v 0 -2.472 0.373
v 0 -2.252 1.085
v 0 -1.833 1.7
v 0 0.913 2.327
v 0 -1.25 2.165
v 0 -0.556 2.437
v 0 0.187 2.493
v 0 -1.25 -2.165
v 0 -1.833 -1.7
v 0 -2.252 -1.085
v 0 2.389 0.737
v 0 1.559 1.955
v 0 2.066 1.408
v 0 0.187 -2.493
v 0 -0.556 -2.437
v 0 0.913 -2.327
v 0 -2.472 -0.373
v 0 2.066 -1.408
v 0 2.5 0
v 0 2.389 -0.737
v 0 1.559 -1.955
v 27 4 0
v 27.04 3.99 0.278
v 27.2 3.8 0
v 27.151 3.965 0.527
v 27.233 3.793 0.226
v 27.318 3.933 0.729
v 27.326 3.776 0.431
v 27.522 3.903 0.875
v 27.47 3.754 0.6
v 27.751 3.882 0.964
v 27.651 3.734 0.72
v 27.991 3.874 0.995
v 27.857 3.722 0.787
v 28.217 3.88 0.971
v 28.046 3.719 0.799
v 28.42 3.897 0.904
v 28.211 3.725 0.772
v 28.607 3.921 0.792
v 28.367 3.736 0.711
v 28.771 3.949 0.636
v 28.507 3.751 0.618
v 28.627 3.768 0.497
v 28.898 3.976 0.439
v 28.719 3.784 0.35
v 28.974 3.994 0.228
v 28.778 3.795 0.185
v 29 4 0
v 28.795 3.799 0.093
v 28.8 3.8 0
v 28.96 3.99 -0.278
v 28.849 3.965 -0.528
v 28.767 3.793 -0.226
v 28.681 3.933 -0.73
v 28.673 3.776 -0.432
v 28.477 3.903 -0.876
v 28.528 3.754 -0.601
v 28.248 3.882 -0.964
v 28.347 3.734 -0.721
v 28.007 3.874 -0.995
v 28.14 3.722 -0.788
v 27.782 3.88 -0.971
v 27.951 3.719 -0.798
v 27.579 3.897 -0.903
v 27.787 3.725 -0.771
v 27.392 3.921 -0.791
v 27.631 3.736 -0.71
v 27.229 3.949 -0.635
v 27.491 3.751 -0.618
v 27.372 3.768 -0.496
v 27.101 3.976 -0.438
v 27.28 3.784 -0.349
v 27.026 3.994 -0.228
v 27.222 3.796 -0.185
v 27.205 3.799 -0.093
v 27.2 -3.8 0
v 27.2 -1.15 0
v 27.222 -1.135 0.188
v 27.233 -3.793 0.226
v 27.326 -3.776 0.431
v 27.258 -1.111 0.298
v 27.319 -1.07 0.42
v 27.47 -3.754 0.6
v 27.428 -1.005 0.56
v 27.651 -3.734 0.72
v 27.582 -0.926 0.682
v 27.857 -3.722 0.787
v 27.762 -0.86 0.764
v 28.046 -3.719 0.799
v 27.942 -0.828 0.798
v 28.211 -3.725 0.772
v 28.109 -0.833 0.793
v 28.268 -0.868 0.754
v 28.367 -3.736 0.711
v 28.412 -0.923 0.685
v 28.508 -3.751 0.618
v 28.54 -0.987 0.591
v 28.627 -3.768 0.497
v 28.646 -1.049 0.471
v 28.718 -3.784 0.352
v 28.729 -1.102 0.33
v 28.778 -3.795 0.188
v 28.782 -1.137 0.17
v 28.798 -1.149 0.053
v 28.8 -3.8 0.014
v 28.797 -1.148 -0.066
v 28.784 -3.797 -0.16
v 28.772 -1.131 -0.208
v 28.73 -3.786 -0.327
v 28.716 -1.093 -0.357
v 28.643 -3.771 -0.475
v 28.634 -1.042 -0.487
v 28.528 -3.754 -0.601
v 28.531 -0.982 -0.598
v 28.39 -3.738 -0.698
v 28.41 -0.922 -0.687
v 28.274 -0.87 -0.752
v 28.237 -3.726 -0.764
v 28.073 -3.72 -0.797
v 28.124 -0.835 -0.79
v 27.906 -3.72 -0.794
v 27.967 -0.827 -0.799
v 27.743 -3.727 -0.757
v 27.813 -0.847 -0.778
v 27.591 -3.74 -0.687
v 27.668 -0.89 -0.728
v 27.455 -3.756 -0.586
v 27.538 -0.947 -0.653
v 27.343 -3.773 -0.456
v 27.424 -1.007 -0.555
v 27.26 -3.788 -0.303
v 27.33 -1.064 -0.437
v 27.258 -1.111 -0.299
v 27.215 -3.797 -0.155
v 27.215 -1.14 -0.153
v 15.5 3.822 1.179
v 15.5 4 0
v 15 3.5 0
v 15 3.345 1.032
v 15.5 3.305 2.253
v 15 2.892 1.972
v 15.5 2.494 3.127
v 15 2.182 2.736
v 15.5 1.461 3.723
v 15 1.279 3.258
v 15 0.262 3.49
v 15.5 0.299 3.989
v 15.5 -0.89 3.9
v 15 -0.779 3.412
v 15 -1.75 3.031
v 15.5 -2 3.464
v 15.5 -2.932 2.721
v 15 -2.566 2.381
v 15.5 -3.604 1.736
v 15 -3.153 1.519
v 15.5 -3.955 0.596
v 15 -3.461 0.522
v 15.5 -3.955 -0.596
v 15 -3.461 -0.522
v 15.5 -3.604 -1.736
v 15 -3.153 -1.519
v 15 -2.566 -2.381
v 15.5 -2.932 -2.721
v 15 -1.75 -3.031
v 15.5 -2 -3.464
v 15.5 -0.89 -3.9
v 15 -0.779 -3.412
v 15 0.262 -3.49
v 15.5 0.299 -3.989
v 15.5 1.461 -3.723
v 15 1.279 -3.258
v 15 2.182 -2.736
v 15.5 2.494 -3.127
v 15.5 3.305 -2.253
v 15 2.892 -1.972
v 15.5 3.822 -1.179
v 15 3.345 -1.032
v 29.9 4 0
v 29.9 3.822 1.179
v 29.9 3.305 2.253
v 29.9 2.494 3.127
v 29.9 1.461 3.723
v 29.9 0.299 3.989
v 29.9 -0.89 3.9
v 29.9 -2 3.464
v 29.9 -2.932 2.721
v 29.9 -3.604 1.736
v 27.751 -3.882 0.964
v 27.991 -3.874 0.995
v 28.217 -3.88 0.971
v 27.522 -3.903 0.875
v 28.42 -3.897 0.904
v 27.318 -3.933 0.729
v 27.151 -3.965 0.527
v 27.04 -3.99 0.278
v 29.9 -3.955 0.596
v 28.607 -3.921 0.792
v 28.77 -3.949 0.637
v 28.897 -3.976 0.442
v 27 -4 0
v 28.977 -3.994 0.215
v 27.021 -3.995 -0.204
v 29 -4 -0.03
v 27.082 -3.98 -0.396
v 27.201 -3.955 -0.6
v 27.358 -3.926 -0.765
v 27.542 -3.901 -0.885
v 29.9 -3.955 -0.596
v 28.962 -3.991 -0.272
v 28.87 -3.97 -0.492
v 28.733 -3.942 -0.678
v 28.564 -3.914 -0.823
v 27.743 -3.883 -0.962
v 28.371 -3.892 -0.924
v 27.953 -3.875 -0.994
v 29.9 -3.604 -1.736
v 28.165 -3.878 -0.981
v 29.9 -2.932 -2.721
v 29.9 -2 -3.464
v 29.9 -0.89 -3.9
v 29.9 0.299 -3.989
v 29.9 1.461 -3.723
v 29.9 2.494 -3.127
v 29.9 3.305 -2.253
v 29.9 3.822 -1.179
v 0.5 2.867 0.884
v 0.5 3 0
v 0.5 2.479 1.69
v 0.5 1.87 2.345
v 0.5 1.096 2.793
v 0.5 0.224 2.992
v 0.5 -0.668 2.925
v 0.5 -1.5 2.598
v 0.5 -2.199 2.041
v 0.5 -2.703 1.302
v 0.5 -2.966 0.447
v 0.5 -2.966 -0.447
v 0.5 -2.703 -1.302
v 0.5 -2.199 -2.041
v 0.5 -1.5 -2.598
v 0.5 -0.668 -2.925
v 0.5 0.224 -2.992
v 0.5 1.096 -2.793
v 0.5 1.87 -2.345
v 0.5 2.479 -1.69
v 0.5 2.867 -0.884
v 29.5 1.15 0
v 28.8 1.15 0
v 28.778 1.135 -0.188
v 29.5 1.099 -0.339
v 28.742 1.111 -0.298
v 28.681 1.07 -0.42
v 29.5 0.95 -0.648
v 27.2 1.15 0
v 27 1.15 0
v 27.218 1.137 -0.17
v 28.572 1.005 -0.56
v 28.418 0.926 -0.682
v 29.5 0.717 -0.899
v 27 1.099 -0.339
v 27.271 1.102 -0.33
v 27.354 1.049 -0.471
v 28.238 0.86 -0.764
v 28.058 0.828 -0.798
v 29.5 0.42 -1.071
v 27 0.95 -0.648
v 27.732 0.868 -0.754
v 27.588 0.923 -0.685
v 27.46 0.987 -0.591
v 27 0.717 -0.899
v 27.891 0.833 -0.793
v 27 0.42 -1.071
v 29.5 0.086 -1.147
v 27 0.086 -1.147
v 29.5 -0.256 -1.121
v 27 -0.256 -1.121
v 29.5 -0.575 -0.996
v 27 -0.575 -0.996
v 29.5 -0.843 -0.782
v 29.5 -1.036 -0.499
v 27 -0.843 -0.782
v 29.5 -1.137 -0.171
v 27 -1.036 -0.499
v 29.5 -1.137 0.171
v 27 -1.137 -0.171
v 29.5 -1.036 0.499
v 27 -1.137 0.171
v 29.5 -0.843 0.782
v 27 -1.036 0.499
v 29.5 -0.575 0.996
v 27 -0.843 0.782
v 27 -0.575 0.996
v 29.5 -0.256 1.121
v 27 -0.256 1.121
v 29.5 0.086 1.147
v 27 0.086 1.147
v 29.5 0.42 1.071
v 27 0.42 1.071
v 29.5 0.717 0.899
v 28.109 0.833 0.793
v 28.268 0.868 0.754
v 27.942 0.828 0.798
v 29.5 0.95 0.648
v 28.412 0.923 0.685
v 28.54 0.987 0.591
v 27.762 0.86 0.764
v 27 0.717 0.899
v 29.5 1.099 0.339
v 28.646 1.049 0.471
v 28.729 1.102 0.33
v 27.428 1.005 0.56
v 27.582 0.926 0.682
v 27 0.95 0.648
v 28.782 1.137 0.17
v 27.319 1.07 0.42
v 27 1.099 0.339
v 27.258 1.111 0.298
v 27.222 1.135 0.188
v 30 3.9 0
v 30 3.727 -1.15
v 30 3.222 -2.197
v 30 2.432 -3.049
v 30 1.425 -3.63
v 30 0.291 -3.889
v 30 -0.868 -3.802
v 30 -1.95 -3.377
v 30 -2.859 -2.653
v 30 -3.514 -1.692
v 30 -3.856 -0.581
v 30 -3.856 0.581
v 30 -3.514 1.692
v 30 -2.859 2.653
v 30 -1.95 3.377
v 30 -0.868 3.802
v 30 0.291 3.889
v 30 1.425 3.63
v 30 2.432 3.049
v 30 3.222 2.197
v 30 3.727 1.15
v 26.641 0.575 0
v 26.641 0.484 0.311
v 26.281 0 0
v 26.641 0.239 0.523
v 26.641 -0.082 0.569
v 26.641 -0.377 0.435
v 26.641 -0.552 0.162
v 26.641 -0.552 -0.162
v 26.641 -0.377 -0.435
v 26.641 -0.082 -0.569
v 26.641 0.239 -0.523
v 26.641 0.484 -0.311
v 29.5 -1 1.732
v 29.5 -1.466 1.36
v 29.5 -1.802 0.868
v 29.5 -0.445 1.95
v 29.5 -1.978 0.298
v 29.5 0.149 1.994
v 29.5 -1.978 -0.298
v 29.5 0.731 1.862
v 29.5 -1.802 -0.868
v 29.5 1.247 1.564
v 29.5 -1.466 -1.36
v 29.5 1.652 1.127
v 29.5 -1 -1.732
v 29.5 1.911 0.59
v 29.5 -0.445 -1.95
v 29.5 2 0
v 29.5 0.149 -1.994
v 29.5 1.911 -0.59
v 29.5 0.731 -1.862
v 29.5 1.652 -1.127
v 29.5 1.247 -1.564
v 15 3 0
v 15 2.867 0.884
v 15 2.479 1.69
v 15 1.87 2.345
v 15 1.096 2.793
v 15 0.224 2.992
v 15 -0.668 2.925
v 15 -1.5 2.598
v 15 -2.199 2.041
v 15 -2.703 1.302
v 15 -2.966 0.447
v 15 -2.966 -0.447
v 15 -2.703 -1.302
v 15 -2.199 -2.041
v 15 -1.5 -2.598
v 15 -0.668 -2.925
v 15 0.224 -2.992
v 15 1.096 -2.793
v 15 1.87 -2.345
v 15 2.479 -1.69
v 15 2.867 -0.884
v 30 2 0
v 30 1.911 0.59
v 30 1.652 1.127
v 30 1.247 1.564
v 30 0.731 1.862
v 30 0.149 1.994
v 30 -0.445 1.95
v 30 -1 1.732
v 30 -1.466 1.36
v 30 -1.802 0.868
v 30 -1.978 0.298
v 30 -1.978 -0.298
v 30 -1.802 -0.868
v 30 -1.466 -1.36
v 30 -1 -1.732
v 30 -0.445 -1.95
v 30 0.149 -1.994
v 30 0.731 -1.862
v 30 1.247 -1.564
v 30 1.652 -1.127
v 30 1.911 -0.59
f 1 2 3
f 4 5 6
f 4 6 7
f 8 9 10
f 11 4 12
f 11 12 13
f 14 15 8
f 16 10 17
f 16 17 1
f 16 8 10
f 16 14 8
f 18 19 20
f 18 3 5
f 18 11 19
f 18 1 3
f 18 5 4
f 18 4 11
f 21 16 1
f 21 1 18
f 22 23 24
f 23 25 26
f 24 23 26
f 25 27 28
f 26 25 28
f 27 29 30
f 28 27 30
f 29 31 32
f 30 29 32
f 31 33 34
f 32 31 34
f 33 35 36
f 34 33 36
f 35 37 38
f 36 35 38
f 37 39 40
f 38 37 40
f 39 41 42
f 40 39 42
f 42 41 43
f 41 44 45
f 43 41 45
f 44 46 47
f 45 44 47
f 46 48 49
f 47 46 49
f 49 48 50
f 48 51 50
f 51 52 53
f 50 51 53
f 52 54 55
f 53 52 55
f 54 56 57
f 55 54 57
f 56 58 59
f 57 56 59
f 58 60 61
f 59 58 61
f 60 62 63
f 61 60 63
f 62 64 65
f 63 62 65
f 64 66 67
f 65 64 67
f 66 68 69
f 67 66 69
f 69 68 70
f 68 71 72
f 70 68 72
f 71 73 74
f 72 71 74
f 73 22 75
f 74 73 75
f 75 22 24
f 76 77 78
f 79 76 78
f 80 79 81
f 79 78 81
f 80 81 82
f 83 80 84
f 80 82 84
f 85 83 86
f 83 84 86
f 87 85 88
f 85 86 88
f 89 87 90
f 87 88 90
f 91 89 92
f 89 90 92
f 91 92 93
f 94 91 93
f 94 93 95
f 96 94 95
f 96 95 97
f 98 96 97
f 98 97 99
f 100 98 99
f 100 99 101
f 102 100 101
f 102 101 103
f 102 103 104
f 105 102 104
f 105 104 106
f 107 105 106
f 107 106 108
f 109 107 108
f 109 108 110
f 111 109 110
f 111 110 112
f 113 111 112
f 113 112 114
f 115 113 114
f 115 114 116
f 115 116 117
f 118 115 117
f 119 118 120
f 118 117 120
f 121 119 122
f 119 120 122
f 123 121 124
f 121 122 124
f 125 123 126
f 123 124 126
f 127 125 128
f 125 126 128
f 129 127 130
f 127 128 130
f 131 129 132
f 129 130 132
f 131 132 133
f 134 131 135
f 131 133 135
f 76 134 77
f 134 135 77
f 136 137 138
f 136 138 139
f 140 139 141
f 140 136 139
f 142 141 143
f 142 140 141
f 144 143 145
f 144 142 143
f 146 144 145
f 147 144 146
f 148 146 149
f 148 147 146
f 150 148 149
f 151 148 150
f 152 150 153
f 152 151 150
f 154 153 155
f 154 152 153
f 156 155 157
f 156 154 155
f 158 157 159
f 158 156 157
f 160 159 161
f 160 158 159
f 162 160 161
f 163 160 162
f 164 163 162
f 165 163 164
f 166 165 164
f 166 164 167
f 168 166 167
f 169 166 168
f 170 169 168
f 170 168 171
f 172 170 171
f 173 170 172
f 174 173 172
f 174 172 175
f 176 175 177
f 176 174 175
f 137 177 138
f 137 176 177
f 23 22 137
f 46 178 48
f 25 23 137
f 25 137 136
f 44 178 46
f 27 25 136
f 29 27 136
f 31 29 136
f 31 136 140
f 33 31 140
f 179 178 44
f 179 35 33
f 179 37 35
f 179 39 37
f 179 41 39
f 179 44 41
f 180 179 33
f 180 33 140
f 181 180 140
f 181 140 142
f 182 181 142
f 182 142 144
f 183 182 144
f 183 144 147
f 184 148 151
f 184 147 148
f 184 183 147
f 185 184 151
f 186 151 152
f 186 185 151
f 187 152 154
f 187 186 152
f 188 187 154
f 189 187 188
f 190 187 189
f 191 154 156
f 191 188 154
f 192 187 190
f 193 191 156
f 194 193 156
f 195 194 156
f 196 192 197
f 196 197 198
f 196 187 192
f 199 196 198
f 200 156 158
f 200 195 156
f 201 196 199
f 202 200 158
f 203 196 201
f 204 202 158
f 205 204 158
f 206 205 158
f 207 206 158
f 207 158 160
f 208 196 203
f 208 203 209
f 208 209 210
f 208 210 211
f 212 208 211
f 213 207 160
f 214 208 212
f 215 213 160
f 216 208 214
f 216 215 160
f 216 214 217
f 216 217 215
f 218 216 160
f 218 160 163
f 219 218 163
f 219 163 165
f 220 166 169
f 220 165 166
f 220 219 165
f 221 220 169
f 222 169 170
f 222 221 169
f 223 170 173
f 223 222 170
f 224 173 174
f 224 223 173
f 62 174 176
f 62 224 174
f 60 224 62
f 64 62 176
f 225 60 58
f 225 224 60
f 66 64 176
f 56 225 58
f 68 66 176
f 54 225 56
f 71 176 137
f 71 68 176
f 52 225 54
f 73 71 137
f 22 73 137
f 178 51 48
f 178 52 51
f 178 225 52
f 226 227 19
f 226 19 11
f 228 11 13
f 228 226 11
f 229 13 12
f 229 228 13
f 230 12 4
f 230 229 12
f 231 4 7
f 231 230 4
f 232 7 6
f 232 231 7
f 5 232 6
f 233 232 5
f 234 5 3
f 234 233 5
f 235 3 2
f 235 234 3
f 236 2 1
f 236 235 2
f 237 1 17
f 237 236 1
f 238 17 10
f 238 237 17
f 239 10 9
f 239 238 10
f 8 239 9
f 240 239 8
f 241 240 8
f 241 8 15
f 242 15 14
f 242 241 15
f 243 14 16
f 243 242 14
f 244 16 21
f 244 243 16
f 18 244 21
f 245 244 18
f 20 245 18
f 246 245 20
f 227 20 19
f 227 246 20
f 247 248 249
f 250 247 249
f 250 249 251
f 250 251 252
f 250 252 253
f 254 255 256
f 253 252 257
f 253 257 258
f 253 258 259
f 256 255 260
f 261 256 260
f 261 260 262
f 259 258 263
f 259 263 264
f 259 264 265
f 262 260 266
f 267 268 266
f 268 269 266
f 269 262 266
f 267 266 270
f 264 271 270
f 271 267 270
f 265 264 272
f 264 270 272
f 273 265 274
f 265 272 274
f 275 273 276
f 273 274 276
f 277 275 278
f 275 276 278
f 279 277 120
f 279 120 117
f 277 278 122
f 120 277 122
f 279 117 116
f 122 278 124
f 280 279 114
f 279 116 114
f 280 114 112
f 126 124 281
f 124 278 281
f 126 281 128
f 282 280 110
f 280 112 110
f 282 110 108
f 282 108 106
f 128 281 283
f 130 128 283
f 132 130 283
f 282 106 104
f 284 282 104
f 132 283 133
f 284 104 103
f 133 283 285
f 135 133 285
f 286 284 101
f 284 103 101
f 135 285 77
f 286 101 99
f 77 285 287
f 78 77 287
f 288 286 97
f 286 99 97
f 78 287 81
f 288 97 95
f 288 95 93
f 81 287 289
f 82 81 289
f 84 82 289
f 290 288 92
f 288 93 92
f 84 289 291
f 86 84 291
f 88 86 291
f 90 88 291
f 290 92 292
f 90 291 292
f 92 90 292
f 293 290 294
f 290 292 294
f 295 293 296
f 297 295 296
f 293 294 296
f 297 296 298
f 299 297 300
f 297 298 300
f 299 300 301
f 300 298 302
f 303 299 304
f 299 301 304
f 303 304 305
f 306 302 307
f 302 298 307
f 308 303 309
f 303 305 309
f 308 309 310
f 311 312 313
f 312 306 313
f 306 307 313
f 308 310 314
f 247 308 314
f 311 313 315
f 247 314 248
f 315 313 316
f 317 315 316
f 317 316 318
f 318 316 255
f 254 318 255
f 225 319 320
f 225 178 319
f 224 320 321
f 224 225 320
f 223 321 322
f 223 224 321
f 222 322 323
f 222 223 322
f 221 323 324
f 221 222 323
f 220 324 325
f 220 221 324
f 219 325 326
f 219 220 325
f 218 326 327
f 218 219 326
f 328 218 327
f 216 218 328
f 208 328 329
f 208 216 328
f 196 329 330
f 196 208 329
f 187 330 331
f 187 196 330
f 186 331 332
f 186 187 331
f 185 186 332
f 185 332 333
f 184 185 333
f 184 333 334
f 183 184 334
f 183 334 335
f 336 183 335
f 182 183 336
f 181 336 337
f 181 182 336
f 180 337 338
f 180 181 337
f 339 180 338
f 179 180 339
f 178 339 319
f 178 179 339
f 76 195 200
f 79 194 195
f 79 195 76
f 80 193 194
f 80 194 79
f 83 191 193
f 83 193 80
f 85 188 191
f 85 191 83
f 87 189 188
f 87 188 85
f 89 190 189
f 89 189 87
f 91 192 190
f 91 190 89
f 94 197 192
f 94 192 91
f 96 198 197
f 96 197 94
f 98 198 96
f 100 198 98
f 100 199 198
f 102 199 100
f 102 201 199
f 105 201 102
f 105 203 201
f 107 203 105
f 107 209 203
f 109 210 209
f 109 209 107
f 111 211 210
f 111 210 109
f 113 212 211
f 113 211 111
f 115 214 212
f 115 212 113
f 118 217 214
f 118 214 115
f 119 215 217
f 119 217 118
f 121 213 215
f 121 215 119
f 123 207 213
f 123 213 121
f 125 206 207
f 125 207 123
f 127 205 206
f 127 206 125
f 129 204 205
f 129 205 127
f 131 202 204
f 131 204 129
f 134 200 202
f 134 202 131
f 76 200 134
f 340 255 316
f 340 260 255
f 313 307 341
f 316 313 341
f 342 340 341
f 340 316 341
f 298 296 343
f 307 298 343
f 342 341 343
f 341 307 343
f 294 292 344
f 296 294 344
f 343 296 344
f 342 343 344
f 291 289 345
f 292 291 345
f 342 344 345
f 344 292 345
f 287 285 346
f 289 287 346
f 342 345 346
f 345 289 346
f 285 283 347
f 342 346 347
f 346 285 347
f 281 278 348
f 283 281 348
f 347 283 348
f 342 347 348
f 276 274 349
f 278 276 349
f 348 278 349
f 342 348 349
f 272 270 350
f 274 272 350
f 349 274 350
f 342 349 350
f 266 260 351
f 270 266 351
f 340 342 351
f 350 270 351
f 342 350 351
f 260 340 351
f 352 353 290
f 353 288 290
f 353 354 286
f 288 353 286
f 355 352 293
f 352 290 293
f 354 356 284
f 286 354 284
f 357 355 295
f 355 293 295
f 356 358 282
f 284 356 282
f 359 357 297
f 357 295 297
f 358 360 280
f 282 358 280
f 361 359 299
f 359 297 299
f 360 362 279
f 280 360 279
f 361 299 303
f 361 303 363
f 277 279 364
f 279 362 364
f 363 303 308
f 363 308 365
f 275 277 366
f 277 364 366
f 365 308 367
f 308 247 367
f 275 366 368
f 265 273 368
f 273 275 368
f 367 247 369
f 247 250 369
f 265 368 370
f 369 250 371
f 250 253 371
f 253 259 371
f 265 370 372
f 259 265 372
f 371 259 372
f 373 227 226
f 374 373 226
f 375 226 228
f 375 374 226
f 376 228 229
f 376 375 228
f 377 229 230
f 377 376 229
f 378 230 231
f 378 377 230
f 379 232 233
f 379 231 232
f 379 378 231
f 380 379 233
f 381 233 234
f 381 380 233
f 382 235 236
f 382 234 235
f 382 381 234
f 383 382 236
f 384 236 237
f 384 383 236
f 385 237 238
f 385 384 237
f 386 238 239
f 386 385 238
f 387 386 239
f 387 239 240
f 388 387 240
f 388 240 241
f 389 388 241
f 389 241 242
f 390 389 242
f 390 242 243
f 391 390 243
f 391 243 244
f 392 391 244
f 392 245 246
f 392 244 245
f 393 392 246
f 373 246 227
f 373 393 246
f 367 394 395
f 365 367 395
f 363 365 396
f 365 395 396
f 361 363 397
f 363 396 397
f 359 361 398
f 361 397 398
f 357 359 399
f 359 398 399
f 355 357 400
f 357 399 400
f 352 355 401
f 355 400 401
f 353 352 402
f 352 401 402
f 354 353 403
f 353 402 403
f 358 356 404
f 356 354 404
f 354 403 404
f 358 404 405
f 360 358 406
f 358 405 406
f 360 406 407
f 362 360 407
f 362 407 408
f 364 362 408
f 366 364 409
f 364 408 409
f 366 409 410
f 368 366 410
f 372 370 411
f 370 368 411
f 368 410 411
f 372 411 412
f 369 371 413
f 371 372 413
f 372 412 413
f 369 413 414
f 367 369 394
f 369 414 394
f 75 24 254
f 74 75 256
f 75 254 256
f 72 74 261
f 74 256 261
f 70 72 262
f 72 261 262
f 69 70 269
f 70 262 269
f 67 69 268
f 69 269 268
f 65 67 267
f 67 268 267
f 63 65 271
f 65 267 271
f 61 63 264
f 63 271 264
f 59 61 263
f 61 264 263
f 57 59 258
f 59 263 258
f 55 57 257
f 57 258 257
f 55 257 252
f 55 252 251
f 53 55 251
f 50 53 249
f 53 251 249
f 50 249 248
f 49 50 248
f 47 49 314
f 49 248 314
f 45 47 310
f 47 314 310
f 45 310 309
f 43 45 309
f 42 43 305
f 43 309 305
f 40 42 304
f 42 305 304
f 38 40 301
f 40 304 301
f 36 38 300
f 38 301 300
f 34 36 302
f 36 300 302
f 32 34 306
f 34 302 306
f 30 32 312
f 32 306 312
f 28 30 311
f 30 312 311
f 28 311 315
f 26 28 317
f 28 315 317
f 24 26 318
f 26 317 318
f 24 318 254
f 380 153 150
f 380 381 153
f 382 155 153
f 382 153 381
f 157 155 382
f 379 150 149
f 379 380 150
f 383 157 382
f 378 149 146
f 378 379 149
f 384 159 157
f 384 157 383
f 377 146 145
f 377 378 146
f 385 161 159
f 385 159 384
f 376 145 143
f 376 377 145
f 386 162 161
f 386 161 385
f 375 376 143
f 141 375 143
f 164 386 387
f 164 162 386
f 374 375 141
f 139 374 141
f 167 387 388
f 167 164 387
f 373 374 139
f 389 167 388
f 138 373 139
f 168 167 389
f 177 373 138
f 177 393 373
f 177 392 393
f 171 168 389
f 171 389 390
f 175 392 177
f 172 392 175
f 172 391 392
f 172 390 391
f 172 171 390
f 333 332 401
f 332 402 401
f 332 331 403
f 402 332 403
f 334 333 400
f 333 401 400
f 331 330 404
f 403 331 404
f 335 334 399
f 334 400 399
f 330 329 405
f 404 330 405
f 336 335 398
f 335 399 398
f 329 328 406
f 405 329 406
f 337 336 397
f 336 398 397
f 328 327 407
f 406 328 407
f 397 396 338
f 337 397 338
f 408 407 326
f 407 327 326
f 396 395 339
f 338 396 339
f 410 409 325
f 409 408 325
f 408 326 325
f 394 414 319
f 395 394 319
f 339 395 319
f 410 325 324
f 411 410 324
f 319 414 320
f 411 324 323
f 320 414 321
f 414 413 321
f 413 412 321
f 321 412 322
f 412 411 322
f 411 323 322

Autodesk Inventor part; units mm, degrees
ref_plane "YZ Plane" through (0, 0, 0) normal (1, 0, 0) x (0, 1, 0)
ref_plane "XZ Plane" through (0, 0, 0) normal (0, 1, 0) x (-1, 0, 0)
ref_plane "XY Plane" through (0, 0, 0) normal (0, 0, 1) x (1, 0, 0)
sketch "Sketch1" plane through (0, 0, 0) normal (0, 0, 1) x (1, 0, 0)
  line L0 (0, 0) -> (0, 3)
  line L1 (0, 3) -> (15, 3)
  line L2 (15, 3) -> (15, 4)
  line L3 (15, 4) -> (30, 4)
  line L4 (30, 4) -> (30, 0)
  line L5 (30, 0) -> (0, 0)
  line L6 (29.5, 0) -> (29.5, 2)
  line L7 (29.5, 2) -> (30, 2)
  line L8 (29.5, 1.15) -> (27, 1.15)
  line L9 (27, 1.15) -> (26.2814, 0)
  line L10 (26.2814, 0) -> (29.5, 0)
  point P0 (0, 1.5)
  point P1 (30, 2)
  dimension "d0" = 3
  dimension "d1" = 4
  dimension "d2" = 15
  dimension "d3" = 30
  dimension "d4" = 2
  dimension "d5" = 0.5
  dimension "d27" = 1.15
  dimension "d28" = 58
  dimension "d29" = 2.5
revolve "Revolution1" add sketch "Sketch1" angle 360 about axis through (30, 0, 0) along (-1, 0, 0) contours L0 L1 L2 L3 L4 L7 L6 L8 L9 L5
chamfer "Chamfer1" distance 0.5 angle 45 2 edges at (0, -3, 0) (15, -4, 0)
chamfer "Chamfer2" distance 0.1 angle 45 1 edges at (30, -4, 0)
sketch "Sketch2" plane through (0, 0, 0) normal (0, 1, 0) x (-1, 0, 0)
  circle A0 centre (-28, 0) radius 0.8
  line L0 (-30, -2) -> (-30, 2) projected
  point P0 (0, 0)
  dimension "d13" = 1.6
  dimension "d14" = 2
extrude "Extrusion1" cut sketch "Sketch2" along normal mid plane 10
chamfer "Chamfer4" distance 0.2 angle 45 3 edges at (28, 3.9192, 0.8) (28.0001, 3.9192, -0.8) (28.8, -4, -0.0013)
thread "Thread2" size "M1.6x0.35" class "6H" standard "ANSI Metric M Profile" length 5
thread "Thread3" size "M1.6x0.35" class "6H" standard "ANSI Metric M Profile" length 3
properties part number "Sp mu SM holder"
